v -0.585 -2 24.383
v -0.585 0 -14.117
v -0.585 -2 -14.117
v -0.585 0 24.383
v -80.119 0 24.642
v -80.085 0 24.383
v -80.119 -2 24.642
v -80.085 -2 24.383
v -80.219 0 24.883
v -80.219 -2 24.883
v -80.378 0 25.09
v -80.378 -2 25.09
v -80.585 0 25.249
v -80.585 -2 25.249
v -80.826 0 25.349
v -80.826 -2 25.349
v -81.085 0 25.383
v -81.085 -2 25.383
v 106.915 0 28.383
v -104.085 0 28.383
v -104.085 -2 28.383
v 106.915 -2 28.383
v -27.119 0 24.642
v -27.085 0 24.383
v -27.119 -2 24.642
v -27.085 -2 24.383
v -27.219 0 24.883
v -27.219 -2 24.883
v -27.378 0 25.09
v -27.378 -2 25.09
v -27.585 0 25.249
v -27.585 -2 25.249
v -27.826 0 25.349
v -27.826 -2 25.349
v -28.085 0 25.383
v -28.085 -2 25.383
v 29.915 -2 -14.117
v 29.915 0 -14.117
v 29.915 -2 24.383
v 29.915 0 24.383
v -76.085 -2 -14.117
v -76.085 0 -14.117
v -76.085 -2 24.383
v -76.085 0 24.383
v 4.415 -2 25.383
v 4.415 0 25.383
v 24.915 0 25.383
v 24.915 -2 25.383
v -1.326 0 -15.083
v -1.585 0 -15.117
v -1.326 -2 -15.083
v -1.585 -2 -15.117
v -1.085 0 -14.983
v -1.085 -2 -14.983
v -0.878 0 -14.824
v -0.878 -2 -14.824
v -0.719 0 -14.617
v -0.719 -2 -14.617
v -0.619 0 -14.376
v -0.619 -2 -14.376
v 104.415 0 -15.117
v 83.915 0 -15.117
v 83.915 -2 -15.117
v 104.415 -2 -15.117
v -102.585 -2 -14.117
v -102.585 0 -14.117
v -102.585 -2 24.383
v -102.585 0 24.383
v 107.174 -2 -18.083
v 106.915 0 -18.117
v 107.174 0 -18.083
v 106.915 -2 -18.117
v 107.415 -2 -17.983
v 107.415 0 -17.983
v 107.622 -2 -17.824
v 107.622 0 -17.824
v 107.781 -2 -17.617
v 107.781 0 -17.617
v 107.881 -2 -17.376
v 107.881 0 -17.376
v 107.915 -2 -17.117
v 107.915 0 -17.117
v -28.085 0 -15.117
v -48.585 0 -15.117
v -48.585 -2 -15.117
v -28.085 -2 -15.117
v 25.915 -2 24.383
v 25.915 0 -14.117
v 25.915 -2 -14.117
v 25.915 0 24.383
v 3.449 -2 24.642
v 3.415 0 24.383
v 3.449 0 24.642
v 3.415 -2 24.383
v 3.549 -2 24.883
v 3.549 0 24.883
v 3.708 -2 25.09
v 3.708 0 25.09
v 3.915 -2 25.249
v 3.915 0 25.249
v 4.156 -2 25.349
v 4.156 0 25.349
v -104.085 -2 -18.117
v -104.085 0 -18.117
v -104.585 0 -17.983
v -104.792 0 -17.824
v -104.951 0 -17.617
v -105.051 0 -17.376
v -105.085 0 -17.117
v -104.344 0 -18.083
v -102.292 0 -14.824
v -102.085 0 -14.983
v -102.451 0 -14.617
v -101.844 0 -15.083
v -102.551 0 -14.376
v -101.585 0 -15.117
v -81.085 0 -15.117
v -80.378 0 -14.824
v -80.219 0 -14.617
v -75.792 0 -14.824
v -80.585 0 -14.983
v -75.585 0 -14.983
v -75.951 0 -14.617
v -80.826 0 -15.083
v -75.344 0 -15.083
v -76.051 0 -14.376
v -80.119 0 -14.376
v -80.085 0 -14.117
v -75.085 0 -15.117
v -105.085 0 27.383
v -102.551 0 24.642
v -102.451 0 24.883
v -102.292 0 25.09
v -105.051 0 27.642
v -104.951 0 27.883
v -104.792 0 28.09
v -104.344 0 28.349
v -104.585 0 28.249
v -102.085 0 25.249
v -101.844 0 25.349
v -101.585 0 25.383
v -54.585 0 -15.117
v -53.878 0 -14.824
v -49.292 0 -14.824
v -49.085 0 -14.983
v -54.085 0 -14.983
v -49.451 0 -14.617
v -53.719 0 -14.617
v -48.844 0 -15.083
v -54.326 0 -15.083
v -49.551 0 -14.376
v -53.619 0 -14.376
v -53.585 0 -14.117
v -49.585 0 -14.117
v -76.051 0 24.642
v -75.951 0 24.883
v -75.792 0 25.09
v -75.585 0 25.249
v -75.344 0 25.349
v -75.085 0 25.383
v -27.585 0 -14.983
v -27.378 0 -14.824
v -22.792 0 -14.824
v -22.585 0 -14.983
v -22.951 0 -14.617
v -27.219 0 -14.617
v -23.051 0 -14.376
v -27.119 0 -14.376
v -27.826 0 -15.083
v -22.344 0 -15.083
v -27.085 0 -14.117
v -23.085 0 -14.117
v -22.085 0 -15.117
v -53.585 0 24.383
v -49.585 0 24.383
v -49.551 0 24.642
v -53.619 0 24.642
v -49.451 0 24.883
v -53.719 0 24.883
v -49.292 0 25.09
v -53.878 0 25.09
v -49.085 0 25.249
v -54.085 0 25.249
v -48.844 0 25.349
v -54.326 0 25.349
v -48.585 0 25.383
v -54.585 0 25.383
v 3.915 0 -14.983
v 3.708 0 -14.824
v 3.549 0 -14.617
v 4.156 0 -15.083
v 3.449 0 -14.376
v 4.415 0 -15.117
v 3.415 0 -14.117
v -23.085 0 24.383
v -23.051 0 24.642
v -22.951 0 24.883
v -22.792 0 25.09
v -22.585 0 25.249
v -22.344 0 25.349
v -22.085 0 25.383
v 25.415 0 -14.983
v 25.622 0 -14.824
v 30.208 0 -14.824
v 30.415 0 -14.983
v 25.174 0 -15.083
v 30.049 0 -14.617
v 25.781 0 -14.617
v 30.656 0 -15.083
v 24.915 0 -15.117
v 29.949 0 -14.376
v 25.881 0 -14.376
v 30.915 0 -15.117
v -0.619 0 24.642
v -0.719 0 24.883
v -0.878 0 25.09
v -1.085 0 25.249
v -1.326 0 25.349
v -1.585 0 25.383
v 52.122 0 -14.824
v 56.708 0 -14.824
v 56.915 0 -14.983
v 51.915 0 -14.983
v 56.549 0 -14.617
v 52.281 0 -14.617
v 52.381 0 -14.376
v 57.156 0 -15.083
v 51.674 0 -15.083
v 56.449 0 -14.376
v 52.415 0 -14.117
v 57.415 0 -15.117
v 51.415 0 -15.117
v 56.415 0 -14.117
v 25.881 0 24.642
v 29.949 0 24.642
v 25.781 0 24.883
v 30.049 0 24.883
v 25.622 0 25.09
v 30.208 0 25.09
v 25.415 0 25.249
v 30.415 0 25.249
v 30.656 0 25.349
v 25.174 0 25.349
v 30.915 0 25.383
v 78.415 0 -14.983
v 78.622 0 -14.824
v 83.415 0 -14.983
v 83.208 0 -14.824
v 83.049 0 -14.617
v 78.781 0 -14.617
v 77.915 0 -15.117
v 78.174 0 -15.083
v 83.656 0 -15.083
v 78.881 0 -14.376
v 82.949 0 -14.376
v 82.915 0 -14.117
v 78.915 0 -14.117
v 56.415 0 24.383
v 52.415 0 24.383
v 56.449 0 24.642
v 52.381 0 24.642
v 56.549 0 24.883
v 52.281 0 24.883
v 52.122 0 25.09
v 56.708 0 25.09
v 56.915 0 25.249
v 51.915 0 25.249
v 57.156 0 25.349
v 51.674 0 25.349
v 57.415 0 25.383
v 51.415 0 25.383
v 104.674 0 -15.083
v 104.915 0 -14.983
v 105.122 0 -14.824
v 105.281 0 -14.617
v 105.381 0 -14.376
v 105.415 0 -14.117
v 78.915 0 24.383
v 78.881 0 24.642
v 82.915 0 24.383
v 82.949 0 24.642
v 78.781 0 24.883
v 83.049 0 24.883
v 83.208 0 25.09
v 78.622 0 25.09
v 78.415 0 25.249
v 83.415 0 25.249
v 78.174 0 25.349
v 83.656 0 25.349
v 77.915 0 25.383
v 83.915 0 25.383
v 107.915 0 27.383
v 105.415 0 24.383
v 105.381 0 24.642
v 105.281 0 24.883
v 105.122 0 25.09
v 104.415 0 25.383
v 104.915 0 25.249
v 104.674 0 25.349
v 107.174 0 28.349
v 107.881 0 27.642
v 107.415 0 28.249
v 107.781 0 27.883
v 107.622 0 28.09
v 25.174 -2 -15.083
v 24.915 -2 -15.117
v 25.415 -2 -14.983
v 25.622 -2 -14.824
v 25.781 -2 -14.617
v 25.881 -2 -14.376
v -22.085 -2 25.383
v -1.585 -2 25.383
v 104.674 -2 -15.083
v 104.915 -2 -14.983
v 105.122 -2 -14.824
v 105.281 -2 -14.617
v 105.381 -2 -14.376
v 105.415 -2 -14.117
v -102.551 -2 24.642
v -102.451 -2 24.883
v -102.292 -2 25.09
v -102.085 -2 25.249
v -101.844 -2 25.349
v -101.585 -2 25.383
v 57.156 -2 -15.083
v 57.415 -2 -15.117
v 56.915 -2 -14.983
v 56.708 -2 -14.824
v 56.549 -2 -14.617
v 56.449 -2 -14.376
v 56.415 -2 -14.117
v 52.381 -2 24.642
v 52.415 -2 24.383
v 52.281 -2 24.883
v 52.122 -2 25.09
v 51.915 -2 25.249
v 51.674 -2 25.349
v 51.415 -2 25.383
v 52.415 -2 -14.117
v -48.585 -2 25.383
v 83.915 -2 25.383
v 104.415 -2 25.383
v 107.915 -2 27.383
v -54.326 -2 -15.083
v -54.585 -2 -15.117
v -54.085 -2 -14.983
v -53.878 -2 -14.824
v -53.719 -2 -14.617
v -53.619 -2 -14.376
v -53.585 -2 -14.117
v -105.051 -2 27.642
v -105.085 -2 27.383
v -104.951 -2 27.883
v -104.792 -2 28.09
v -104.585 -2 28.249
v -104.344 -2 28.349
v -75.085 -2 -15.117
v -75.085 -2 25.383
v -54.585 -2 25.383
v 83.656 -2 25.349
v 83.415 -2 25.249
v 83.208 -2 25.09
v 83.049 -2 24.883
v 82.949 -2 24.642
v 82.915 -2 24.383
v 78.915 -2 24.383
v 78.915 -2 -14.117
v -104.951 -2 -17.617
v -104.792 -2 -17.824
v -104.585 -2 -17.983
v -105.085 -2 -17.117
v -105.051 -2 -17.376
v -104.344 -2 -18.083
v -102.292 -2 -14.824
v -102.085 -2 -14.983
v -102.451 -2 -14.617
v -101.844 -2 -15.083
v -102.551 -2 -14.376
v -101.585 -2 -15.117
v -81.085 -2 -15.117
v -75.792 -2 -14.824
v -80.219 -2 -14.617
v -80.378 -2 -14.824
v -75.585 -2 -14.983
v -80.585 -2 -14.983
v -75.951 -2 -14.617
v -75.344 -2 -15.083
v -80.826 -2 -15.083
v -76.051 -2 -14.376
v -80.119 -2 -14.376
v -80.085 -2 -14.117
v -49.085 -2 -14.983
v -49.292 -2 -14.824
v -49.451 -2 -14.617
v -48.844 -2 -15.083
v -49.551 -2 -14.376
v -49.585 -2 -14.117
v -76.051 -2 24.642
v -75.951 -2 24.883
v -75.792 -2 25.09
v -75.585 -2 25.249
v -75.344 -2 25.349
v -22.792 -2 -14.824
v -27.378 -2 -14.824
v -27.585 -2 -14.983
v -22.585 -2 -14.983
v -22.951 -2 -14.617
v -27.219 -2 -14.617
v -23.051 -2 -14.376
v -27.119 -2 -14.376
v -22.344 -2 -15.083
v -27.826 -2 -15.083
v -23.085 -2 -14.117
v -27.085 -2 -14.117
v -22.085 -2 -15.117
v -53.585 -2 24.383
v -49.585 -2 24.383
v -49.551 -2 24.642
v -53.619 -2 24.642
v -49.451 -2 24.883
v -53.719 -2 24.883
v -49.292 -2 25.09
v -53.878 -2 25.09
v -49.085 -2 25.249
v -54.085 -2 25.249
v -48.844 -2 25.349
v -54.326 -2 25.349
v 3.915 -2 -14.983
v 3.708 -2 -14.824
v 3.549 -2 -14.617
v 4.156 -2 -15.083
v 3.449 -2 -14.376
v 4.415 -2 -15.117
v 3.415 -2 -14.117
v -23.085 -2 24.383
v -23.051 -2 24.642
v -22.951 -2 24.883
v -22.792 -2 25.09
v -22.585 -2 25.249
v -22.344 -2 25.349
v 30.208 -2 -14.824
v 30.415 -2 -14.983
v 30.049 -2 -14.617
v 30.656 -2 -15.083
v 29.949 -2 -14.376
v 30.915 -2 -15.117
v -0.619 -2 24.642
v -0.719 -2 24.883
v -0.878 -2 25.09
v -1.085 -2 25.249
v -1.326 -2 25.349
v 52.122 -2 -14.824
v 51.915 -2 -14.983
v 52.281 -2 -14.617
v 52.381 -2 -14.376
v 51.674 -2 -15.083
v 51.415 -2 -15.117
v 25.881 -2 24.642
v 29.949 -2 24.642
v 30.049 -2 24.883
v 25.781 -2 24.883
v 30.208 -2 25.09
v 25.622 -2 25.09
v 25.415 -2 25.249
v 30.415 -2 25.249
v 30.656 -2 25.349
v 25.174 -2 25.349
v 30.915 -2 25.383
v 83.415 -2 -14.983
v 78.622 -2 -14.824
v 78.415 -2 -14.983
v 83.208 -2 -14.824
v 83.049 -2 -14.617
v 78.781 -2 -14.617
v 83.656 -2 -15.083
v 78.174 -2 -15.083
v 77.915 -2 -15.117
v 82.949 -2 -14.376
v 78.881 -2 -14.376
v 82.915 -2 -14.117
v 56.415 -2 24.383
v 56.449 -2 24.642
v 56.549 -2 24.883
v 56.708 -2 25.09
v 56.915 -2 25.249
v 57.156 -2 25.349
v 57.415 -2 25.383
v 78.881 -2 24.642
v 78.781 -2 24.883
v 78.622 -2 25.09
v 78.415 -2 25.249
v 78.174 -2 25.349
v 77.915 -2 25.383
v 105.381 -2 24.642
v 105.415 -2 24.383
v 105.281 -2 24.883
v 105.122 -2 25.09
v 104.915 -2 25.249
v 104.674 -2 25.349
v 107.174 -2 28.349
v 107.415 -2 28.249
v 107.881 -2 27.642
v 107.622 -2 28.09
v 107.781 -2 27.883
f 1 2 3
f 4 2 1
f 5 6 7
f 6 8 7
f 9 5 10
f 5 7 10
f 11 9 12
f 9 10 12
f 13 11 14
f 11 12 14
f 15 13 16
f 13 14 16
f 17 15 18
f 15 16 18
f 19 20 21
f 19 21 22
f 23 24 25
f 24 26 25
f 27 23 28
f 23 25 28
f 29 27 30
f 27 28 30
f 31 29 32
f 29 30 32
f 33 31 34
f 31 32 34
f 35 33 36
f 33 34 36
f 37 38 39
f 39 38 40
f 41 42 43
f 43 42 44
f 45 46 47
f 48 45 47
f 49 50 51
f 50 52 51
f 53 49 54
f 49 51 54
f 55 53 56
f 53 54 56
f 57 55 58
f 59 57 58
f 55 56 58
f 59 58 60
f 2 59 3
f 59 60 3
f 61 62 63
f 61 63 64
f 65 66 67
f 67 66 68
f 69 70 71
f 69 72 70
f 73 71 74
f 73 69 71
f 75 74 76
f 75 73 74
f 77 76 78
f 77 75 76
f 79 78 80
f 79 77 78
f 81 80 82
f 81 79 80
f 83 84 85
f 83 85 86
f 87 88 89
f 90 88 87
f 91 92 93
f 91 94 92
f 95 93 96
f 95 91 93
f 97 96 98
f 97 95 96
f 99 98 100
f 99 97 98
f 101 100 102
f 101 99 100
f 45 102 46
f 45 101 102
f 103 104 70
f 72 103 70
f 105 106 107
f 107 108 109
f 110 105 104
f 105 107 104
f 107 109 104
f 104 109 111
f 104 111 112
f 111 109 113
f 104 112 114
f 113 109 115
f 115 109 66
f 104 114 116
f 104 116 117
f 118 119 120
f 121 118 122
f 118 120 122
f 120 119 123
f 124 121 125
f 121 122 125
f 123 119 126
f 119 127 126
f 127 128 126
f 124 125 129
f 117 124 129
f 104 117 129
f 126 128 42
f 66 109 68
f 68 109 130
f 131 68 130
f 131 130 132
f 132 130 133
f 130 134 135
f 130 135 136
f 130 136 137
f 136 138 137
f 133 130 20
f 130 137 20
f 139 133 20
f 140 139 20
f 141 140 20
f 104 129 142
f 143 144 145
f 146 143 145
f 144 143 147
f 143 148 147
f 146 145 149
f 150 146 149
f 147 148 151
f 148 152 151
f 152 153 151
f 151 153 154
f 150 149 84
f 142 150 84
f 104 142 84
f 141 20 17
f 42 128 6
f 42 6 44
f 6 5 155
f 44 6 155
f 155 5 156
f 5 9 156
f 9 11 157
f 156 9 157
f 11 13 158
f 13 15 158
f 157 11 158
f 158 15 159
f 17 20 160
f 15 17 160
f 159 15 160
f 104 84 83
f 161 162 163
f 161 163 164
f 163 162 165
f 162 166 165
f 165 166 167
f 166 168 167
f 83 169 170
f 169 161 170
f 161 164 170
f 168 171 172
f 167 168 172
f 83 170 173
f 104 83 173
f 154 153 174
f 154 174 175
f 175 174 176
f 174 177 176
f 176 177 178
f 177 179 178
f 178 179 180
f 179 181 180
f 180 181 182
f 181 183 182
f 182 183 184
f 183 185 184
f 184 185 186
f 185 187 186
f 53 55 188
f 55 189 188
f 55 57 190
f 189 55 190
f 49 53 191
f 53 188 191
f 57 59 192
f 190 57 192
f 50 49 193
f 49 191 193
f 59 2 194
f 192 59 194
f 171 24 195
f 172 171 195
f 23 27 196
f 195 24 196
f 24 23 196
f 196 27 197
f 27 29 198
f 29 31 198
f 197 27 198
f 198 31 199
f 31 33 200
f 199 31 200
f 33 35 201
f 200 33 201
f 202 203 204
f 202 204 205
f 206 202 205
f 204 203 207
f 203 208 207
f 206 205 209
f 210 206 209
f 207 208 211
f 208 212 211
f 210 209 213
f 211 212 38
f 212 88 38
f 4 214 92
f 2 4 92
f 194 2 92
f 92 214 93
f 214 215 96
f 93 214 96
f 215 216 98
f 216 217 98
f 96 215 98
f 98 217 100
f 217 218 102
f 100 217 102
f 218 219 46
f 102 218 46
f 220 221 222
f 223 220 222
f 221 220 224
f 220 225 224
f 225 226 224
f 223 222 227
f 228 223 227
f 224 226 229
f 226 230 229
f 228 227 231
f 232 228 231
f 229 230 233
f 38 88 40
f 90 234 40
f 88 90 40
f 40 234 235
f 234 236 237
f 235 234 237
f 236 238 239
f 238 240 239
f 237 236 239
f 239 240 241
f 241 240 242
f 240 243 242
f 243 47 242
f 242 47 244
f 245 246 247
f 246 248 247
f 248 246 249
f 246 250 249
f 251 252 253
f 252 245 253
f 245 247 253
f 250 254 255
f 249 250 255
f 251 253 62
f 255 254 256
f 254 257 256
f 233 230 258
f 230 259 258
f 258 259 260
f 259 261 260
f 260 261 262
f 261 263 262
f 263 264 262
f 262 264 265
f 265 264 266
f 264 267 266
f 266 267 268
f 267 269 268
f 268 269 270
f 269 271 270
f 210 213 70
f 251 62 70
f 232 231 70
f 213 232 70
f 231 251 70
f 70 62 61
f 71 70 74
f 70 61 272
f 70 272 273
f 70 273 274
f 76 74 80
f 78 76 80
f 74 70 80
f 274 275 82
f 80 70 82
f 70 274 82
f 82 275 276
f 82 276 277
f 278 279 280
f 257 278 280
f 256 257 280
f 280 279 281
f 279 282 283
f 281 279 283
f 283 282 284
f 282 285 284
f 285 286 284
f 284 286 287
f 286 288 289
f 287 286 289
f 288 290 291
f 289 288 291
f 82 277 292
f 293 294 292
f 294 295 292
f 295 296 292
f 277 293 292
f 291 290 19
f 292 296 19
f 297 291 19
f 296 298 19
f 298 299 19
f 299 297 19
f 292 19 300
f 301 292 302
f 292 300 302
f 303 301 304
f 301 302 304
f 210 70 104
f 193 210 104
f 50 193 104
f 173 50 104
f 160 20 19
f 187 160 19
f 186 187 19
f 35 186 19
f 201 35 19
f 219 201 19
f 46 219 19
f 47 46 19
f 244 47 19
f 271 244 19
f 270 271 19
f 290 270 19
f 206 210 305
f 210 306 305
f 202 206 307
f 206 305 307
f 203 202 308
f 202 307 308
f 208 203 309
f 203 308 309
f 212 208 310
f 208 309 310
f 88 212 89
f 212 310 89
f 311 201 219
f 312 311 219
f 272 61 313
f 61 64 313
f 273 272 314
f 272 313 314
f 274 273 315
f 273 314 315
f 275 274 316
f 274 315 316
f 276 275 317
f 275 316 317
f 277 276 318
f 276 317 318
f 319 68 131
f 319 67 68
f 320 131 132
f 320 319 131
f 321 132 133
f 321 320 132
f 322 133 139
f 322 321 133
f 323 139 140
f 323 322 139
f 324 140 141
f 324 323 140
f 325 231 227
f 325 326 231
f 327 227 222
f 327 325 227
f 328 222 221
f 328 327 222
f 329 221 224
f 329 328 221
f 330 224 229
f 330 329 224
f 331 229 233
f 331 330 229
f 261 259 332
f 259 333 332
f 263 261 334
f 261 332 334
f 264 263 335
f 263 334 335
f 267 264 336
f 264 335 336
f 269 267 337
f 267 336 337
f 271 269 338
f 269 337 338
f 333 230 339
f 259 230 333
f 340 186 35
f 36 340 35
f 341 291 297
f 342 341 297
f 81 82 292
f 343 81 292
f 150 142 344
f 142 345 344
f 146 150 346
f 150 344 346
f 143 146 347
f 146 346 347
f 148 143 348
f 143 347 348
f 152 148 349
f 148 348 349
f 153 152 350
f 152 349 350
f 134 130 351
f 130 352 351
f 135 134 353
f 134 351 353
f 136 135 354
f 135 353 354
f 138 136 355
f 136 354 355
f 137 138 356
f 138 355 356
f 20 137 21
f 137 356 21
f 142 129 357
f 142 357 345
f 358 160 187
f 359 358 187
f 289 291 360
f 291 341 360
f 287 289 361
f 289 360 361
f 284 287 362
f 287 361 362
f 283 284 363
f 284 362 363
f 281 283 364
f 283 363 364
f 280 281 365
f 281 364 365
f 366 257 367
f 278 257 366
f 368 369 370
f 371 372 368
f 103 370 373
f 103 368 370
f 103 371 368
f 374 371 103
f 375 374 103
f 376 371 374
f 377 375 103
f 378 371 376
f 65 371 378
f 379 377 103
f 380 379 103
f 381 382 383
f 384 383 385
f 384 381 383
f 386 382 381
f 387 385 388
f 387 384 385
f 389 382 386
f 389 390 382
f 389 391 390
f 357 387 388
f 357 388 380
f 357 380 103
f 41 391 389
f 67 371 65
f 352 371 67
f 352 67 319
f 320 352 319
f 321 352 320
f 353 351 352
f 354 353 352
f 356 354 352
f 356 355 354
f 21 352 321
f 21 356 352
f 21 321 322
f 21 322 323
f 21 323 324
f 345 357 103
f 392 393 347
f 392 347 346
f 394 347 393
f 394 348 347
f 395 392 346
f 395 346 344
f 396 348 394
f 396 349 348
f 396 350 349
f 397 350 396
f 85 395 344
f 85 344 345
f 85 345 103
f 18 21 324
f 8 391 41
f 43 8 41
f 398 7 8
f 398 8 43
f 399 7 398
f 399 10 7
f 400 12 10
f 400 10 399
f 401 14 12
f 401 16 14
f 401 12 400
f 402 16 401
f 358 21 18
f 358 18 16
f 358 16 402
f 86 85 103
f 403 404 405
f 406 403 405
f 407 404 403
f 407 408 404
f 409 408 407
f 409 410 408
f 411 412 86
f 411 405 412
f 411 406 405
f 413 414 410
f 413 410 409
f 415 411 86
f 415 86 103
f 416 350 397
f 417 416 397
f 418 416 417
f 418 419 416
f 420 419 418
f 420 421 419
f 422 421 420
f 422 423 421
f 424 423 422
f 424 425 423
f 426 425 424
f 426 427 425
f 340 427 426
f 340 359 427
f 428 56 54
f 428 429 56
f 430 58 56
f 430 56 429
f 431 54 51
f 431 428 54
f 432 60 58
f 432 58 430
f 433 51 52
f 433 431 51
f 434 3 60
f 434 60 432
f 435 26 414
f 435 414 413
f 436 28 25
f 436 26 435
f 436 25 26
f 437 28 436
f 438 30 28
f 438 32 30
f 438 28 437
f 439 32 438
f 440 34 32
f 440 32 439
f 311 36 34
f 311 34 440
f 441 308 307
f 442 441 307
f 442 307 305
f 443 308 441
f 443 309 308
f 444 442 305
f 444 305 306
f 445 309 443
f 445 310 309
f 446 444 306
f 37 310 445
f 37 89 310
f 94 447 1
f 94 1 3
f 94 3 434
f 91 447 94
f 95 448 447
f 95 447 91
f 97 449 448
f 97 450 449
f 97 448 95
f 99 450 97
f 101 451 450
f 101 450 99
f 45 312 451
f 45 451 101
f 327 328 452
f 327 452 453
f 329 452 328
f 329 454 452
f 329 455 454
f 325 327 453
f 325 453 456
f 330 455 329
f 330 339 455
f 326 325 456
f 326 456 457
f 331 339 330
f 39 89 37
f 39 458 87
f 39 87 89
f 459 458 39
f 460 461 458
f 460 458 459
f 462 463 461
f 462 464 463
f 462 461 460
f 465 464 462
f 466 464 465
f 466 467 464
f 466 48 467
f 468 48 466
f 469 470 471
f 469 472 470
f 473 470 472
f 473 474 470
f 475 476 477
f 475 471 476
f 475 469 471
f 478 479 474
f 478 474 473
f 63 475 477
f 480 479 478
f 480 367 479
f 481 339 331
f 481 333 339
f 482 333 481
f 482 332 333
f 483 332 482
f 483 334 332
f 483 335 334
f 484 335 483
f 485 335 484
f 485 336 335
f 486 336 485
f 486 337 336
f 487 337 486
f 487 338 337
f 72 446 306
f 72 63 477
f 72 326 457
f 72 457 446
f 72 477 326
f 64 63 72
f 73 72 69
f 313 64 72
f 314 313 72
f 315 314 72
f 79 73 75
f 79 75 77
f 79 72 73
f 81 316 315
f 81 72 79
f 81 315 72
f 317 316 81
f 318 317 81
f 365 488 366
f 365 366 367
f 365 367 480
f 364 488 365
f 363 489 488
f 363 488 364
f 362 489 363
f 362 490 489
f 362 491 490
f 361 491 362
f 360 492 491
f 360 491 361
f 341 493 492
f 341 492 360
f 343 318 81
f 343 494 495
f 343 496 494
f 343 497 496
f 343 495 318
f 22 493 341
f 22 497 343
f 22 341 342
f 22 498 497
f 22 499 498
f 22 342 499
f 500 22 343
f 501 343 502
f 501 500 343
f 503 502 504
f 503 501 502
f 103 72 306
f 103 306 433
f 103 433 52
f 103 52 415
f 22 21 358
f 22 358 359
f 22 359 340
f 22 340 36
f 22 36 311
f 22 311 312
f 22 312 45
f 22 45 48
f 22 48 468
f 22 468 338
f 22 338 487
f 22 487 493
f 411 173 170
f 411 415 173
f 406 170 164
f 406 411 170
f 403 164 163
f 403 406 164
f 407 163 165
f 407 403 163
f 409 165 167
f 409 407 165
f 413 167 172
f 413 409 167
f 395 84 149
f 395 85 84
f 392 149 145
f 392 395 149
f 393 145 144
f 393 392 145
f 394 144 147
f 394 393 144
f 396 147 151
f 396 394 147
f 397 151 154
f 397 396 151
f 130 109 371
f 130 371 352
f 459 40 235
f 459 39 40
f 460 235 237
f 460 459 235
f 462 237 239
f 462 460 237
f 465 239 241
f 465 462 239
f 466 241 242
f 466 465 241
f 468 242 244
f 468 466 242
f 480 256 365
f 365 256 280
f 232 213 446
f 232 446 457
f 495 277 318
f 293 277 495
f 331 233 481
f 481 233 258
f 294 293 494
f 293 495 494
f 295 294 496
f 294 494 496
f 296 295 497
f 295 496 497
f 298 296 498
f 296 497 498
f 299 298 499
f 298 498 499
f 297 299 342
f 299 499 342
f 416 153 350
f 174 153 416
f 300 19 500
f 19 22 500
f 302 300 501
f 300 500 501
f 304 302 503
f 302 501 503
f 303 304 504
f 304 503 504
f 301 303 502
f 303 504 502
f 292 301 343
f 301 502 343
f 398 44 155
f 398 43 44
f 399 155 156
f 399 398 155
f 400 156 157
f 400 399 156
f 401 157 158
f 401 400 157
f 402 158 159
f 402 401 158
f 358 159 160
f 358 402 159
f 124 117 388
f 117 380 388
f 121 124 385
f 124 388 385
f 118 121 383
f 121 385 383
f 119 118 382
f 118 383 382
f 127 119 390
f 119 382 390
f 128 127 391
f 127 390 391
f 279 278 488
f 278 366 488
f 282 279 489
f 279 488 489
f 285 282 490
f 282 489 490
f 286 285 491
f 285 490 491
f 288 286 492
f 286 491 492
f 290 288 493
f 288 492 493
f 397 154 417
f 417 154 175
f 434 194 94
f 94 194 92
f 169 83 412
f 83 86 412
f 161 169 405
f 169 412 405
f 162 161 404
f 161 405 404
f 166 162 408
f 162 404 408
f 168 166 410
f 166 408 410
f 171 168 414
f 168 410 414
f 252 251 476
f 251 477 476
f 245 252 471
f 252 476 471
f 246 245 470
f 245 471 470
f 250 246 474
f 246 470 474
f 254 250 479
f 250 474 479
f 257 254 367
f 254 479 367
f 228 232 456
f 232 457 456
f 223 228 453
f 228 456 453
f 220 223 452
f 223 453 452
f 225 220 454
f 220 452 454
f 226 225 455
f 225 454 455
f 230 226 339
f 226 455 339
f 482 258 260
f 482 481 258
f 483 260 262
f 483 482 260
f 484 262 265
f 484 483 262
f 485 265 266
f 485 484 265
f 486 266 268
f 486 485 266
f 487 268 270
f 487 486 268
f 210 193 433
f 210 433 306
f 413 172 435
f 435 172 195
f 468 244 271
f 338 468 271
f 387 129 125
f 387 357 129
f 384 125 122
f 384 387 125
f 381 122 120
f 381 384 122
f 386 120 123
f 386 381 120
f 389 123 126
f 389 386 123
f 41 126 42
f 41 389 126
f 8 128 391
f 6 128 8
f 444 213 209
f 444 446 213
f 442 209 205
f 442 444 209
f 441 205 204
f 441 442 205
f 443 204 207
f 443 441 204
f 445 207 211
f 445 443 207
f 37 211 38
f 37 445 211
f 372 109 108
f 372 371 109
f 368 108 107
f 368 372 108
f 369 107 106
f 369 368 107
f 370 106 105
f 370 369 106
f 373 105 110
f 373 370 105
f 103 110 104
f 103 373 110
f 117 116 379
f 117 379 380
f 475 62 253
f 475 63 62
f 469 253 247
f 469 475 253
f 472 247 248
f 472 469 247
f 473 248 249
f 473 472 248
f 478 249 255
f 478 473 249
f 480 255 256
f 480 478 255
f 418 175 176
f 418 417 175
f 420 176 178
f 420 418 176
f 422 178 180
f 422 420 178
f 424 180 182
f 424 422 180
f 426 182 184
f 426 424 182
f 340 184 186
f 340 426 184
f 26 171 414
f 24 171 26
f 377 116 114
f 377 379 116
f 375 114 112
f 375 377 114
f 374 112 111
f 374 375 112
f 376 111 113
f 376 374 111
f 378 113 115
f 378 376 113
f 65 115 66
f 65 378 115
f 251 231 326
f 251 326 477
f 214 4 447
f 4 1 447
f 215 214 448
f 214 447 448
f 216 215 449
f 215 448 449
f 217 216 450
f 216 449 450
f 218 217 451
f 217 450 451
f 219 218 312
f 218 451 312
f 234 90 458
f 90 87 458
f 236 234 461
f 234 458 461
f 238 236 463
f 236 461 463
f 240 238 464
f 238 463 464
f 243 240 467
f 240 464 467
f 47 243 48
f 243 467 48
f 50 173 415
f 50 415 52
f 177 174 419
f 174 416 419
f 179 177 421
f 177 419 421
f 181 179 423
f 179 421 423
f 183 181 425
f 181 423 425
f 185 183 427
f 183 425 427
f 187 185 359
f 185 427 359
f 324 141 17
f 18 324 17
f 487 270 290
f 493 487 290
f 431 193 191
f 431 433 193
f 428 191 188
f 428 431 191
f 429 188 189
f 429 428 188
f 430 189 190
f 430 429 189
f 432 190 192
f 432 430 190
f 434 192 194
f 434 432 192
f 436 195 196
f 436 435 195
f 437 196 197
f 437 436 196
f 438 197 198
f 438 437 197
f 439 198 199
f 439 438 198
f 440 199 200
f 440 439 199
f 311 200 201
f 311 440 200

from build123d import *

# Parameters (mm, degrees)
F0_W     = 213
F0_H     = 46.5
F0_W_2   = 22.5
F0_H_2   = 40.5
F1_DEPTH = 2
F2_R     = 1


# Not quite as in the source:
# - a feature names something its author has since deleted; it is built from what else it names


with BuildPart() as f1:
    # F0 (on Front) → F1 (new body)
    with BuildSketch(Plane.XZ):
        with Locations((1.4150981574, 5.1332409506)):
            Rectangle(F0_W, F0_H)
        with Locations((-91.3349018426, 5.1332409506)):
            Rectangle(F0_W_2, F0_H_2, mode=Mode.SUBTRACT)
        with Locations((-64.8349018426, 5.1332409506)):
            Rectangle(F0_W_2, F0_H_2, mode=Mode.SUBTRACT)
        with Locations((-38.3349018426, 5.1332409506)):
            Rectangle(F0_W_2, F0_H_2, mode=Mode.SUBTRACT)
        with Locations((-11.8349018426, 5.1332409506)):
            Rectangle(F0_W_2, F0_H_2, mode=Mode.SUBTRACT)
        with Locations((14.6650981574, 5.1332409506)):
            Rectangle(F0_W_2, F0_H_2, mode=Mode.SUBTRACT)
        with Locations((41.1650981574, 5.1332409506)):
            Rectangle(F0_W_2, F0_H_2, mode=Mode.SUBTRACT)
        with Locations((67.6650981574, 5.1332409506)):
            Rectangle(F0_W_2, F0_H_2, mode=Mode.SUBTRACT)
        with Locations((94.1650981574, 5.1332409506)):
            Rectangle(F0_W_2, F0_H_2, mode=Mode.SUBTRACT)
    extrude(amount=F1_DEPTH)

    # F2
    f2_edges = [f1.edges().sort_by_distance(p)[0] for p in [
        (-80.084902, -1, 25.383241),
        (-102.584902, -1, 25.383241),
        (-80.084902, -1, -15.116759),
        (-102.584902, -1, -15.116759),
        (107.915098, -1, 28.383241),
        (107.915098, -1, -18.116759),
        (-105.084902, -1, 28.383241),
        (-105.084902, -1, -18.116759),
        (-76.084902, -1, 25.383241),
        (-49.584902, -1, 25.383241),
        (-23.084902, -1, 25.383241),
        (3.415098, -1, 25.383241),
        (29.915098, -1, 25.383241),
        (56.415098, -1, 25.383241),
        (82.915098, -1, 25.383241),
        (-53.584902, -1, 25.383241),
        (-27.084902, -1, 25.383241),
        (-0.584902, -1, 25.383241),
        (25.915098, -1, 25.383241),
        (52.415098, -1, 25.383241),
        (78.915098, -1, 25.383241),
        (105.415098, -1, 25.383241),
        (-76.084902, -1, -15.116759),
        (-49.584902, -1, -15.116759),
        (-23.084902, -1, -15.116759),
        (3.415098, -1, -15.116759),
        (29.915098, -1, -15.116759),
        (56.415098, -1, -15.116759),
        (82.915098, -1, -15.116759),
        (-53.584902, -1, -15.116759),
        (-27.084902, -1, -15.116759),
        (-0.584902, -1, -15.116759),
        (25.915098, -1, -15.116759),
        (52.415098, -1, -15.116759),
        (78.915098, -1, -15.116759),
        (105.415098, -1, -15.116759),
    ]]
    fillet(f2_edges, radius=F2_R)


solid = f1.part
